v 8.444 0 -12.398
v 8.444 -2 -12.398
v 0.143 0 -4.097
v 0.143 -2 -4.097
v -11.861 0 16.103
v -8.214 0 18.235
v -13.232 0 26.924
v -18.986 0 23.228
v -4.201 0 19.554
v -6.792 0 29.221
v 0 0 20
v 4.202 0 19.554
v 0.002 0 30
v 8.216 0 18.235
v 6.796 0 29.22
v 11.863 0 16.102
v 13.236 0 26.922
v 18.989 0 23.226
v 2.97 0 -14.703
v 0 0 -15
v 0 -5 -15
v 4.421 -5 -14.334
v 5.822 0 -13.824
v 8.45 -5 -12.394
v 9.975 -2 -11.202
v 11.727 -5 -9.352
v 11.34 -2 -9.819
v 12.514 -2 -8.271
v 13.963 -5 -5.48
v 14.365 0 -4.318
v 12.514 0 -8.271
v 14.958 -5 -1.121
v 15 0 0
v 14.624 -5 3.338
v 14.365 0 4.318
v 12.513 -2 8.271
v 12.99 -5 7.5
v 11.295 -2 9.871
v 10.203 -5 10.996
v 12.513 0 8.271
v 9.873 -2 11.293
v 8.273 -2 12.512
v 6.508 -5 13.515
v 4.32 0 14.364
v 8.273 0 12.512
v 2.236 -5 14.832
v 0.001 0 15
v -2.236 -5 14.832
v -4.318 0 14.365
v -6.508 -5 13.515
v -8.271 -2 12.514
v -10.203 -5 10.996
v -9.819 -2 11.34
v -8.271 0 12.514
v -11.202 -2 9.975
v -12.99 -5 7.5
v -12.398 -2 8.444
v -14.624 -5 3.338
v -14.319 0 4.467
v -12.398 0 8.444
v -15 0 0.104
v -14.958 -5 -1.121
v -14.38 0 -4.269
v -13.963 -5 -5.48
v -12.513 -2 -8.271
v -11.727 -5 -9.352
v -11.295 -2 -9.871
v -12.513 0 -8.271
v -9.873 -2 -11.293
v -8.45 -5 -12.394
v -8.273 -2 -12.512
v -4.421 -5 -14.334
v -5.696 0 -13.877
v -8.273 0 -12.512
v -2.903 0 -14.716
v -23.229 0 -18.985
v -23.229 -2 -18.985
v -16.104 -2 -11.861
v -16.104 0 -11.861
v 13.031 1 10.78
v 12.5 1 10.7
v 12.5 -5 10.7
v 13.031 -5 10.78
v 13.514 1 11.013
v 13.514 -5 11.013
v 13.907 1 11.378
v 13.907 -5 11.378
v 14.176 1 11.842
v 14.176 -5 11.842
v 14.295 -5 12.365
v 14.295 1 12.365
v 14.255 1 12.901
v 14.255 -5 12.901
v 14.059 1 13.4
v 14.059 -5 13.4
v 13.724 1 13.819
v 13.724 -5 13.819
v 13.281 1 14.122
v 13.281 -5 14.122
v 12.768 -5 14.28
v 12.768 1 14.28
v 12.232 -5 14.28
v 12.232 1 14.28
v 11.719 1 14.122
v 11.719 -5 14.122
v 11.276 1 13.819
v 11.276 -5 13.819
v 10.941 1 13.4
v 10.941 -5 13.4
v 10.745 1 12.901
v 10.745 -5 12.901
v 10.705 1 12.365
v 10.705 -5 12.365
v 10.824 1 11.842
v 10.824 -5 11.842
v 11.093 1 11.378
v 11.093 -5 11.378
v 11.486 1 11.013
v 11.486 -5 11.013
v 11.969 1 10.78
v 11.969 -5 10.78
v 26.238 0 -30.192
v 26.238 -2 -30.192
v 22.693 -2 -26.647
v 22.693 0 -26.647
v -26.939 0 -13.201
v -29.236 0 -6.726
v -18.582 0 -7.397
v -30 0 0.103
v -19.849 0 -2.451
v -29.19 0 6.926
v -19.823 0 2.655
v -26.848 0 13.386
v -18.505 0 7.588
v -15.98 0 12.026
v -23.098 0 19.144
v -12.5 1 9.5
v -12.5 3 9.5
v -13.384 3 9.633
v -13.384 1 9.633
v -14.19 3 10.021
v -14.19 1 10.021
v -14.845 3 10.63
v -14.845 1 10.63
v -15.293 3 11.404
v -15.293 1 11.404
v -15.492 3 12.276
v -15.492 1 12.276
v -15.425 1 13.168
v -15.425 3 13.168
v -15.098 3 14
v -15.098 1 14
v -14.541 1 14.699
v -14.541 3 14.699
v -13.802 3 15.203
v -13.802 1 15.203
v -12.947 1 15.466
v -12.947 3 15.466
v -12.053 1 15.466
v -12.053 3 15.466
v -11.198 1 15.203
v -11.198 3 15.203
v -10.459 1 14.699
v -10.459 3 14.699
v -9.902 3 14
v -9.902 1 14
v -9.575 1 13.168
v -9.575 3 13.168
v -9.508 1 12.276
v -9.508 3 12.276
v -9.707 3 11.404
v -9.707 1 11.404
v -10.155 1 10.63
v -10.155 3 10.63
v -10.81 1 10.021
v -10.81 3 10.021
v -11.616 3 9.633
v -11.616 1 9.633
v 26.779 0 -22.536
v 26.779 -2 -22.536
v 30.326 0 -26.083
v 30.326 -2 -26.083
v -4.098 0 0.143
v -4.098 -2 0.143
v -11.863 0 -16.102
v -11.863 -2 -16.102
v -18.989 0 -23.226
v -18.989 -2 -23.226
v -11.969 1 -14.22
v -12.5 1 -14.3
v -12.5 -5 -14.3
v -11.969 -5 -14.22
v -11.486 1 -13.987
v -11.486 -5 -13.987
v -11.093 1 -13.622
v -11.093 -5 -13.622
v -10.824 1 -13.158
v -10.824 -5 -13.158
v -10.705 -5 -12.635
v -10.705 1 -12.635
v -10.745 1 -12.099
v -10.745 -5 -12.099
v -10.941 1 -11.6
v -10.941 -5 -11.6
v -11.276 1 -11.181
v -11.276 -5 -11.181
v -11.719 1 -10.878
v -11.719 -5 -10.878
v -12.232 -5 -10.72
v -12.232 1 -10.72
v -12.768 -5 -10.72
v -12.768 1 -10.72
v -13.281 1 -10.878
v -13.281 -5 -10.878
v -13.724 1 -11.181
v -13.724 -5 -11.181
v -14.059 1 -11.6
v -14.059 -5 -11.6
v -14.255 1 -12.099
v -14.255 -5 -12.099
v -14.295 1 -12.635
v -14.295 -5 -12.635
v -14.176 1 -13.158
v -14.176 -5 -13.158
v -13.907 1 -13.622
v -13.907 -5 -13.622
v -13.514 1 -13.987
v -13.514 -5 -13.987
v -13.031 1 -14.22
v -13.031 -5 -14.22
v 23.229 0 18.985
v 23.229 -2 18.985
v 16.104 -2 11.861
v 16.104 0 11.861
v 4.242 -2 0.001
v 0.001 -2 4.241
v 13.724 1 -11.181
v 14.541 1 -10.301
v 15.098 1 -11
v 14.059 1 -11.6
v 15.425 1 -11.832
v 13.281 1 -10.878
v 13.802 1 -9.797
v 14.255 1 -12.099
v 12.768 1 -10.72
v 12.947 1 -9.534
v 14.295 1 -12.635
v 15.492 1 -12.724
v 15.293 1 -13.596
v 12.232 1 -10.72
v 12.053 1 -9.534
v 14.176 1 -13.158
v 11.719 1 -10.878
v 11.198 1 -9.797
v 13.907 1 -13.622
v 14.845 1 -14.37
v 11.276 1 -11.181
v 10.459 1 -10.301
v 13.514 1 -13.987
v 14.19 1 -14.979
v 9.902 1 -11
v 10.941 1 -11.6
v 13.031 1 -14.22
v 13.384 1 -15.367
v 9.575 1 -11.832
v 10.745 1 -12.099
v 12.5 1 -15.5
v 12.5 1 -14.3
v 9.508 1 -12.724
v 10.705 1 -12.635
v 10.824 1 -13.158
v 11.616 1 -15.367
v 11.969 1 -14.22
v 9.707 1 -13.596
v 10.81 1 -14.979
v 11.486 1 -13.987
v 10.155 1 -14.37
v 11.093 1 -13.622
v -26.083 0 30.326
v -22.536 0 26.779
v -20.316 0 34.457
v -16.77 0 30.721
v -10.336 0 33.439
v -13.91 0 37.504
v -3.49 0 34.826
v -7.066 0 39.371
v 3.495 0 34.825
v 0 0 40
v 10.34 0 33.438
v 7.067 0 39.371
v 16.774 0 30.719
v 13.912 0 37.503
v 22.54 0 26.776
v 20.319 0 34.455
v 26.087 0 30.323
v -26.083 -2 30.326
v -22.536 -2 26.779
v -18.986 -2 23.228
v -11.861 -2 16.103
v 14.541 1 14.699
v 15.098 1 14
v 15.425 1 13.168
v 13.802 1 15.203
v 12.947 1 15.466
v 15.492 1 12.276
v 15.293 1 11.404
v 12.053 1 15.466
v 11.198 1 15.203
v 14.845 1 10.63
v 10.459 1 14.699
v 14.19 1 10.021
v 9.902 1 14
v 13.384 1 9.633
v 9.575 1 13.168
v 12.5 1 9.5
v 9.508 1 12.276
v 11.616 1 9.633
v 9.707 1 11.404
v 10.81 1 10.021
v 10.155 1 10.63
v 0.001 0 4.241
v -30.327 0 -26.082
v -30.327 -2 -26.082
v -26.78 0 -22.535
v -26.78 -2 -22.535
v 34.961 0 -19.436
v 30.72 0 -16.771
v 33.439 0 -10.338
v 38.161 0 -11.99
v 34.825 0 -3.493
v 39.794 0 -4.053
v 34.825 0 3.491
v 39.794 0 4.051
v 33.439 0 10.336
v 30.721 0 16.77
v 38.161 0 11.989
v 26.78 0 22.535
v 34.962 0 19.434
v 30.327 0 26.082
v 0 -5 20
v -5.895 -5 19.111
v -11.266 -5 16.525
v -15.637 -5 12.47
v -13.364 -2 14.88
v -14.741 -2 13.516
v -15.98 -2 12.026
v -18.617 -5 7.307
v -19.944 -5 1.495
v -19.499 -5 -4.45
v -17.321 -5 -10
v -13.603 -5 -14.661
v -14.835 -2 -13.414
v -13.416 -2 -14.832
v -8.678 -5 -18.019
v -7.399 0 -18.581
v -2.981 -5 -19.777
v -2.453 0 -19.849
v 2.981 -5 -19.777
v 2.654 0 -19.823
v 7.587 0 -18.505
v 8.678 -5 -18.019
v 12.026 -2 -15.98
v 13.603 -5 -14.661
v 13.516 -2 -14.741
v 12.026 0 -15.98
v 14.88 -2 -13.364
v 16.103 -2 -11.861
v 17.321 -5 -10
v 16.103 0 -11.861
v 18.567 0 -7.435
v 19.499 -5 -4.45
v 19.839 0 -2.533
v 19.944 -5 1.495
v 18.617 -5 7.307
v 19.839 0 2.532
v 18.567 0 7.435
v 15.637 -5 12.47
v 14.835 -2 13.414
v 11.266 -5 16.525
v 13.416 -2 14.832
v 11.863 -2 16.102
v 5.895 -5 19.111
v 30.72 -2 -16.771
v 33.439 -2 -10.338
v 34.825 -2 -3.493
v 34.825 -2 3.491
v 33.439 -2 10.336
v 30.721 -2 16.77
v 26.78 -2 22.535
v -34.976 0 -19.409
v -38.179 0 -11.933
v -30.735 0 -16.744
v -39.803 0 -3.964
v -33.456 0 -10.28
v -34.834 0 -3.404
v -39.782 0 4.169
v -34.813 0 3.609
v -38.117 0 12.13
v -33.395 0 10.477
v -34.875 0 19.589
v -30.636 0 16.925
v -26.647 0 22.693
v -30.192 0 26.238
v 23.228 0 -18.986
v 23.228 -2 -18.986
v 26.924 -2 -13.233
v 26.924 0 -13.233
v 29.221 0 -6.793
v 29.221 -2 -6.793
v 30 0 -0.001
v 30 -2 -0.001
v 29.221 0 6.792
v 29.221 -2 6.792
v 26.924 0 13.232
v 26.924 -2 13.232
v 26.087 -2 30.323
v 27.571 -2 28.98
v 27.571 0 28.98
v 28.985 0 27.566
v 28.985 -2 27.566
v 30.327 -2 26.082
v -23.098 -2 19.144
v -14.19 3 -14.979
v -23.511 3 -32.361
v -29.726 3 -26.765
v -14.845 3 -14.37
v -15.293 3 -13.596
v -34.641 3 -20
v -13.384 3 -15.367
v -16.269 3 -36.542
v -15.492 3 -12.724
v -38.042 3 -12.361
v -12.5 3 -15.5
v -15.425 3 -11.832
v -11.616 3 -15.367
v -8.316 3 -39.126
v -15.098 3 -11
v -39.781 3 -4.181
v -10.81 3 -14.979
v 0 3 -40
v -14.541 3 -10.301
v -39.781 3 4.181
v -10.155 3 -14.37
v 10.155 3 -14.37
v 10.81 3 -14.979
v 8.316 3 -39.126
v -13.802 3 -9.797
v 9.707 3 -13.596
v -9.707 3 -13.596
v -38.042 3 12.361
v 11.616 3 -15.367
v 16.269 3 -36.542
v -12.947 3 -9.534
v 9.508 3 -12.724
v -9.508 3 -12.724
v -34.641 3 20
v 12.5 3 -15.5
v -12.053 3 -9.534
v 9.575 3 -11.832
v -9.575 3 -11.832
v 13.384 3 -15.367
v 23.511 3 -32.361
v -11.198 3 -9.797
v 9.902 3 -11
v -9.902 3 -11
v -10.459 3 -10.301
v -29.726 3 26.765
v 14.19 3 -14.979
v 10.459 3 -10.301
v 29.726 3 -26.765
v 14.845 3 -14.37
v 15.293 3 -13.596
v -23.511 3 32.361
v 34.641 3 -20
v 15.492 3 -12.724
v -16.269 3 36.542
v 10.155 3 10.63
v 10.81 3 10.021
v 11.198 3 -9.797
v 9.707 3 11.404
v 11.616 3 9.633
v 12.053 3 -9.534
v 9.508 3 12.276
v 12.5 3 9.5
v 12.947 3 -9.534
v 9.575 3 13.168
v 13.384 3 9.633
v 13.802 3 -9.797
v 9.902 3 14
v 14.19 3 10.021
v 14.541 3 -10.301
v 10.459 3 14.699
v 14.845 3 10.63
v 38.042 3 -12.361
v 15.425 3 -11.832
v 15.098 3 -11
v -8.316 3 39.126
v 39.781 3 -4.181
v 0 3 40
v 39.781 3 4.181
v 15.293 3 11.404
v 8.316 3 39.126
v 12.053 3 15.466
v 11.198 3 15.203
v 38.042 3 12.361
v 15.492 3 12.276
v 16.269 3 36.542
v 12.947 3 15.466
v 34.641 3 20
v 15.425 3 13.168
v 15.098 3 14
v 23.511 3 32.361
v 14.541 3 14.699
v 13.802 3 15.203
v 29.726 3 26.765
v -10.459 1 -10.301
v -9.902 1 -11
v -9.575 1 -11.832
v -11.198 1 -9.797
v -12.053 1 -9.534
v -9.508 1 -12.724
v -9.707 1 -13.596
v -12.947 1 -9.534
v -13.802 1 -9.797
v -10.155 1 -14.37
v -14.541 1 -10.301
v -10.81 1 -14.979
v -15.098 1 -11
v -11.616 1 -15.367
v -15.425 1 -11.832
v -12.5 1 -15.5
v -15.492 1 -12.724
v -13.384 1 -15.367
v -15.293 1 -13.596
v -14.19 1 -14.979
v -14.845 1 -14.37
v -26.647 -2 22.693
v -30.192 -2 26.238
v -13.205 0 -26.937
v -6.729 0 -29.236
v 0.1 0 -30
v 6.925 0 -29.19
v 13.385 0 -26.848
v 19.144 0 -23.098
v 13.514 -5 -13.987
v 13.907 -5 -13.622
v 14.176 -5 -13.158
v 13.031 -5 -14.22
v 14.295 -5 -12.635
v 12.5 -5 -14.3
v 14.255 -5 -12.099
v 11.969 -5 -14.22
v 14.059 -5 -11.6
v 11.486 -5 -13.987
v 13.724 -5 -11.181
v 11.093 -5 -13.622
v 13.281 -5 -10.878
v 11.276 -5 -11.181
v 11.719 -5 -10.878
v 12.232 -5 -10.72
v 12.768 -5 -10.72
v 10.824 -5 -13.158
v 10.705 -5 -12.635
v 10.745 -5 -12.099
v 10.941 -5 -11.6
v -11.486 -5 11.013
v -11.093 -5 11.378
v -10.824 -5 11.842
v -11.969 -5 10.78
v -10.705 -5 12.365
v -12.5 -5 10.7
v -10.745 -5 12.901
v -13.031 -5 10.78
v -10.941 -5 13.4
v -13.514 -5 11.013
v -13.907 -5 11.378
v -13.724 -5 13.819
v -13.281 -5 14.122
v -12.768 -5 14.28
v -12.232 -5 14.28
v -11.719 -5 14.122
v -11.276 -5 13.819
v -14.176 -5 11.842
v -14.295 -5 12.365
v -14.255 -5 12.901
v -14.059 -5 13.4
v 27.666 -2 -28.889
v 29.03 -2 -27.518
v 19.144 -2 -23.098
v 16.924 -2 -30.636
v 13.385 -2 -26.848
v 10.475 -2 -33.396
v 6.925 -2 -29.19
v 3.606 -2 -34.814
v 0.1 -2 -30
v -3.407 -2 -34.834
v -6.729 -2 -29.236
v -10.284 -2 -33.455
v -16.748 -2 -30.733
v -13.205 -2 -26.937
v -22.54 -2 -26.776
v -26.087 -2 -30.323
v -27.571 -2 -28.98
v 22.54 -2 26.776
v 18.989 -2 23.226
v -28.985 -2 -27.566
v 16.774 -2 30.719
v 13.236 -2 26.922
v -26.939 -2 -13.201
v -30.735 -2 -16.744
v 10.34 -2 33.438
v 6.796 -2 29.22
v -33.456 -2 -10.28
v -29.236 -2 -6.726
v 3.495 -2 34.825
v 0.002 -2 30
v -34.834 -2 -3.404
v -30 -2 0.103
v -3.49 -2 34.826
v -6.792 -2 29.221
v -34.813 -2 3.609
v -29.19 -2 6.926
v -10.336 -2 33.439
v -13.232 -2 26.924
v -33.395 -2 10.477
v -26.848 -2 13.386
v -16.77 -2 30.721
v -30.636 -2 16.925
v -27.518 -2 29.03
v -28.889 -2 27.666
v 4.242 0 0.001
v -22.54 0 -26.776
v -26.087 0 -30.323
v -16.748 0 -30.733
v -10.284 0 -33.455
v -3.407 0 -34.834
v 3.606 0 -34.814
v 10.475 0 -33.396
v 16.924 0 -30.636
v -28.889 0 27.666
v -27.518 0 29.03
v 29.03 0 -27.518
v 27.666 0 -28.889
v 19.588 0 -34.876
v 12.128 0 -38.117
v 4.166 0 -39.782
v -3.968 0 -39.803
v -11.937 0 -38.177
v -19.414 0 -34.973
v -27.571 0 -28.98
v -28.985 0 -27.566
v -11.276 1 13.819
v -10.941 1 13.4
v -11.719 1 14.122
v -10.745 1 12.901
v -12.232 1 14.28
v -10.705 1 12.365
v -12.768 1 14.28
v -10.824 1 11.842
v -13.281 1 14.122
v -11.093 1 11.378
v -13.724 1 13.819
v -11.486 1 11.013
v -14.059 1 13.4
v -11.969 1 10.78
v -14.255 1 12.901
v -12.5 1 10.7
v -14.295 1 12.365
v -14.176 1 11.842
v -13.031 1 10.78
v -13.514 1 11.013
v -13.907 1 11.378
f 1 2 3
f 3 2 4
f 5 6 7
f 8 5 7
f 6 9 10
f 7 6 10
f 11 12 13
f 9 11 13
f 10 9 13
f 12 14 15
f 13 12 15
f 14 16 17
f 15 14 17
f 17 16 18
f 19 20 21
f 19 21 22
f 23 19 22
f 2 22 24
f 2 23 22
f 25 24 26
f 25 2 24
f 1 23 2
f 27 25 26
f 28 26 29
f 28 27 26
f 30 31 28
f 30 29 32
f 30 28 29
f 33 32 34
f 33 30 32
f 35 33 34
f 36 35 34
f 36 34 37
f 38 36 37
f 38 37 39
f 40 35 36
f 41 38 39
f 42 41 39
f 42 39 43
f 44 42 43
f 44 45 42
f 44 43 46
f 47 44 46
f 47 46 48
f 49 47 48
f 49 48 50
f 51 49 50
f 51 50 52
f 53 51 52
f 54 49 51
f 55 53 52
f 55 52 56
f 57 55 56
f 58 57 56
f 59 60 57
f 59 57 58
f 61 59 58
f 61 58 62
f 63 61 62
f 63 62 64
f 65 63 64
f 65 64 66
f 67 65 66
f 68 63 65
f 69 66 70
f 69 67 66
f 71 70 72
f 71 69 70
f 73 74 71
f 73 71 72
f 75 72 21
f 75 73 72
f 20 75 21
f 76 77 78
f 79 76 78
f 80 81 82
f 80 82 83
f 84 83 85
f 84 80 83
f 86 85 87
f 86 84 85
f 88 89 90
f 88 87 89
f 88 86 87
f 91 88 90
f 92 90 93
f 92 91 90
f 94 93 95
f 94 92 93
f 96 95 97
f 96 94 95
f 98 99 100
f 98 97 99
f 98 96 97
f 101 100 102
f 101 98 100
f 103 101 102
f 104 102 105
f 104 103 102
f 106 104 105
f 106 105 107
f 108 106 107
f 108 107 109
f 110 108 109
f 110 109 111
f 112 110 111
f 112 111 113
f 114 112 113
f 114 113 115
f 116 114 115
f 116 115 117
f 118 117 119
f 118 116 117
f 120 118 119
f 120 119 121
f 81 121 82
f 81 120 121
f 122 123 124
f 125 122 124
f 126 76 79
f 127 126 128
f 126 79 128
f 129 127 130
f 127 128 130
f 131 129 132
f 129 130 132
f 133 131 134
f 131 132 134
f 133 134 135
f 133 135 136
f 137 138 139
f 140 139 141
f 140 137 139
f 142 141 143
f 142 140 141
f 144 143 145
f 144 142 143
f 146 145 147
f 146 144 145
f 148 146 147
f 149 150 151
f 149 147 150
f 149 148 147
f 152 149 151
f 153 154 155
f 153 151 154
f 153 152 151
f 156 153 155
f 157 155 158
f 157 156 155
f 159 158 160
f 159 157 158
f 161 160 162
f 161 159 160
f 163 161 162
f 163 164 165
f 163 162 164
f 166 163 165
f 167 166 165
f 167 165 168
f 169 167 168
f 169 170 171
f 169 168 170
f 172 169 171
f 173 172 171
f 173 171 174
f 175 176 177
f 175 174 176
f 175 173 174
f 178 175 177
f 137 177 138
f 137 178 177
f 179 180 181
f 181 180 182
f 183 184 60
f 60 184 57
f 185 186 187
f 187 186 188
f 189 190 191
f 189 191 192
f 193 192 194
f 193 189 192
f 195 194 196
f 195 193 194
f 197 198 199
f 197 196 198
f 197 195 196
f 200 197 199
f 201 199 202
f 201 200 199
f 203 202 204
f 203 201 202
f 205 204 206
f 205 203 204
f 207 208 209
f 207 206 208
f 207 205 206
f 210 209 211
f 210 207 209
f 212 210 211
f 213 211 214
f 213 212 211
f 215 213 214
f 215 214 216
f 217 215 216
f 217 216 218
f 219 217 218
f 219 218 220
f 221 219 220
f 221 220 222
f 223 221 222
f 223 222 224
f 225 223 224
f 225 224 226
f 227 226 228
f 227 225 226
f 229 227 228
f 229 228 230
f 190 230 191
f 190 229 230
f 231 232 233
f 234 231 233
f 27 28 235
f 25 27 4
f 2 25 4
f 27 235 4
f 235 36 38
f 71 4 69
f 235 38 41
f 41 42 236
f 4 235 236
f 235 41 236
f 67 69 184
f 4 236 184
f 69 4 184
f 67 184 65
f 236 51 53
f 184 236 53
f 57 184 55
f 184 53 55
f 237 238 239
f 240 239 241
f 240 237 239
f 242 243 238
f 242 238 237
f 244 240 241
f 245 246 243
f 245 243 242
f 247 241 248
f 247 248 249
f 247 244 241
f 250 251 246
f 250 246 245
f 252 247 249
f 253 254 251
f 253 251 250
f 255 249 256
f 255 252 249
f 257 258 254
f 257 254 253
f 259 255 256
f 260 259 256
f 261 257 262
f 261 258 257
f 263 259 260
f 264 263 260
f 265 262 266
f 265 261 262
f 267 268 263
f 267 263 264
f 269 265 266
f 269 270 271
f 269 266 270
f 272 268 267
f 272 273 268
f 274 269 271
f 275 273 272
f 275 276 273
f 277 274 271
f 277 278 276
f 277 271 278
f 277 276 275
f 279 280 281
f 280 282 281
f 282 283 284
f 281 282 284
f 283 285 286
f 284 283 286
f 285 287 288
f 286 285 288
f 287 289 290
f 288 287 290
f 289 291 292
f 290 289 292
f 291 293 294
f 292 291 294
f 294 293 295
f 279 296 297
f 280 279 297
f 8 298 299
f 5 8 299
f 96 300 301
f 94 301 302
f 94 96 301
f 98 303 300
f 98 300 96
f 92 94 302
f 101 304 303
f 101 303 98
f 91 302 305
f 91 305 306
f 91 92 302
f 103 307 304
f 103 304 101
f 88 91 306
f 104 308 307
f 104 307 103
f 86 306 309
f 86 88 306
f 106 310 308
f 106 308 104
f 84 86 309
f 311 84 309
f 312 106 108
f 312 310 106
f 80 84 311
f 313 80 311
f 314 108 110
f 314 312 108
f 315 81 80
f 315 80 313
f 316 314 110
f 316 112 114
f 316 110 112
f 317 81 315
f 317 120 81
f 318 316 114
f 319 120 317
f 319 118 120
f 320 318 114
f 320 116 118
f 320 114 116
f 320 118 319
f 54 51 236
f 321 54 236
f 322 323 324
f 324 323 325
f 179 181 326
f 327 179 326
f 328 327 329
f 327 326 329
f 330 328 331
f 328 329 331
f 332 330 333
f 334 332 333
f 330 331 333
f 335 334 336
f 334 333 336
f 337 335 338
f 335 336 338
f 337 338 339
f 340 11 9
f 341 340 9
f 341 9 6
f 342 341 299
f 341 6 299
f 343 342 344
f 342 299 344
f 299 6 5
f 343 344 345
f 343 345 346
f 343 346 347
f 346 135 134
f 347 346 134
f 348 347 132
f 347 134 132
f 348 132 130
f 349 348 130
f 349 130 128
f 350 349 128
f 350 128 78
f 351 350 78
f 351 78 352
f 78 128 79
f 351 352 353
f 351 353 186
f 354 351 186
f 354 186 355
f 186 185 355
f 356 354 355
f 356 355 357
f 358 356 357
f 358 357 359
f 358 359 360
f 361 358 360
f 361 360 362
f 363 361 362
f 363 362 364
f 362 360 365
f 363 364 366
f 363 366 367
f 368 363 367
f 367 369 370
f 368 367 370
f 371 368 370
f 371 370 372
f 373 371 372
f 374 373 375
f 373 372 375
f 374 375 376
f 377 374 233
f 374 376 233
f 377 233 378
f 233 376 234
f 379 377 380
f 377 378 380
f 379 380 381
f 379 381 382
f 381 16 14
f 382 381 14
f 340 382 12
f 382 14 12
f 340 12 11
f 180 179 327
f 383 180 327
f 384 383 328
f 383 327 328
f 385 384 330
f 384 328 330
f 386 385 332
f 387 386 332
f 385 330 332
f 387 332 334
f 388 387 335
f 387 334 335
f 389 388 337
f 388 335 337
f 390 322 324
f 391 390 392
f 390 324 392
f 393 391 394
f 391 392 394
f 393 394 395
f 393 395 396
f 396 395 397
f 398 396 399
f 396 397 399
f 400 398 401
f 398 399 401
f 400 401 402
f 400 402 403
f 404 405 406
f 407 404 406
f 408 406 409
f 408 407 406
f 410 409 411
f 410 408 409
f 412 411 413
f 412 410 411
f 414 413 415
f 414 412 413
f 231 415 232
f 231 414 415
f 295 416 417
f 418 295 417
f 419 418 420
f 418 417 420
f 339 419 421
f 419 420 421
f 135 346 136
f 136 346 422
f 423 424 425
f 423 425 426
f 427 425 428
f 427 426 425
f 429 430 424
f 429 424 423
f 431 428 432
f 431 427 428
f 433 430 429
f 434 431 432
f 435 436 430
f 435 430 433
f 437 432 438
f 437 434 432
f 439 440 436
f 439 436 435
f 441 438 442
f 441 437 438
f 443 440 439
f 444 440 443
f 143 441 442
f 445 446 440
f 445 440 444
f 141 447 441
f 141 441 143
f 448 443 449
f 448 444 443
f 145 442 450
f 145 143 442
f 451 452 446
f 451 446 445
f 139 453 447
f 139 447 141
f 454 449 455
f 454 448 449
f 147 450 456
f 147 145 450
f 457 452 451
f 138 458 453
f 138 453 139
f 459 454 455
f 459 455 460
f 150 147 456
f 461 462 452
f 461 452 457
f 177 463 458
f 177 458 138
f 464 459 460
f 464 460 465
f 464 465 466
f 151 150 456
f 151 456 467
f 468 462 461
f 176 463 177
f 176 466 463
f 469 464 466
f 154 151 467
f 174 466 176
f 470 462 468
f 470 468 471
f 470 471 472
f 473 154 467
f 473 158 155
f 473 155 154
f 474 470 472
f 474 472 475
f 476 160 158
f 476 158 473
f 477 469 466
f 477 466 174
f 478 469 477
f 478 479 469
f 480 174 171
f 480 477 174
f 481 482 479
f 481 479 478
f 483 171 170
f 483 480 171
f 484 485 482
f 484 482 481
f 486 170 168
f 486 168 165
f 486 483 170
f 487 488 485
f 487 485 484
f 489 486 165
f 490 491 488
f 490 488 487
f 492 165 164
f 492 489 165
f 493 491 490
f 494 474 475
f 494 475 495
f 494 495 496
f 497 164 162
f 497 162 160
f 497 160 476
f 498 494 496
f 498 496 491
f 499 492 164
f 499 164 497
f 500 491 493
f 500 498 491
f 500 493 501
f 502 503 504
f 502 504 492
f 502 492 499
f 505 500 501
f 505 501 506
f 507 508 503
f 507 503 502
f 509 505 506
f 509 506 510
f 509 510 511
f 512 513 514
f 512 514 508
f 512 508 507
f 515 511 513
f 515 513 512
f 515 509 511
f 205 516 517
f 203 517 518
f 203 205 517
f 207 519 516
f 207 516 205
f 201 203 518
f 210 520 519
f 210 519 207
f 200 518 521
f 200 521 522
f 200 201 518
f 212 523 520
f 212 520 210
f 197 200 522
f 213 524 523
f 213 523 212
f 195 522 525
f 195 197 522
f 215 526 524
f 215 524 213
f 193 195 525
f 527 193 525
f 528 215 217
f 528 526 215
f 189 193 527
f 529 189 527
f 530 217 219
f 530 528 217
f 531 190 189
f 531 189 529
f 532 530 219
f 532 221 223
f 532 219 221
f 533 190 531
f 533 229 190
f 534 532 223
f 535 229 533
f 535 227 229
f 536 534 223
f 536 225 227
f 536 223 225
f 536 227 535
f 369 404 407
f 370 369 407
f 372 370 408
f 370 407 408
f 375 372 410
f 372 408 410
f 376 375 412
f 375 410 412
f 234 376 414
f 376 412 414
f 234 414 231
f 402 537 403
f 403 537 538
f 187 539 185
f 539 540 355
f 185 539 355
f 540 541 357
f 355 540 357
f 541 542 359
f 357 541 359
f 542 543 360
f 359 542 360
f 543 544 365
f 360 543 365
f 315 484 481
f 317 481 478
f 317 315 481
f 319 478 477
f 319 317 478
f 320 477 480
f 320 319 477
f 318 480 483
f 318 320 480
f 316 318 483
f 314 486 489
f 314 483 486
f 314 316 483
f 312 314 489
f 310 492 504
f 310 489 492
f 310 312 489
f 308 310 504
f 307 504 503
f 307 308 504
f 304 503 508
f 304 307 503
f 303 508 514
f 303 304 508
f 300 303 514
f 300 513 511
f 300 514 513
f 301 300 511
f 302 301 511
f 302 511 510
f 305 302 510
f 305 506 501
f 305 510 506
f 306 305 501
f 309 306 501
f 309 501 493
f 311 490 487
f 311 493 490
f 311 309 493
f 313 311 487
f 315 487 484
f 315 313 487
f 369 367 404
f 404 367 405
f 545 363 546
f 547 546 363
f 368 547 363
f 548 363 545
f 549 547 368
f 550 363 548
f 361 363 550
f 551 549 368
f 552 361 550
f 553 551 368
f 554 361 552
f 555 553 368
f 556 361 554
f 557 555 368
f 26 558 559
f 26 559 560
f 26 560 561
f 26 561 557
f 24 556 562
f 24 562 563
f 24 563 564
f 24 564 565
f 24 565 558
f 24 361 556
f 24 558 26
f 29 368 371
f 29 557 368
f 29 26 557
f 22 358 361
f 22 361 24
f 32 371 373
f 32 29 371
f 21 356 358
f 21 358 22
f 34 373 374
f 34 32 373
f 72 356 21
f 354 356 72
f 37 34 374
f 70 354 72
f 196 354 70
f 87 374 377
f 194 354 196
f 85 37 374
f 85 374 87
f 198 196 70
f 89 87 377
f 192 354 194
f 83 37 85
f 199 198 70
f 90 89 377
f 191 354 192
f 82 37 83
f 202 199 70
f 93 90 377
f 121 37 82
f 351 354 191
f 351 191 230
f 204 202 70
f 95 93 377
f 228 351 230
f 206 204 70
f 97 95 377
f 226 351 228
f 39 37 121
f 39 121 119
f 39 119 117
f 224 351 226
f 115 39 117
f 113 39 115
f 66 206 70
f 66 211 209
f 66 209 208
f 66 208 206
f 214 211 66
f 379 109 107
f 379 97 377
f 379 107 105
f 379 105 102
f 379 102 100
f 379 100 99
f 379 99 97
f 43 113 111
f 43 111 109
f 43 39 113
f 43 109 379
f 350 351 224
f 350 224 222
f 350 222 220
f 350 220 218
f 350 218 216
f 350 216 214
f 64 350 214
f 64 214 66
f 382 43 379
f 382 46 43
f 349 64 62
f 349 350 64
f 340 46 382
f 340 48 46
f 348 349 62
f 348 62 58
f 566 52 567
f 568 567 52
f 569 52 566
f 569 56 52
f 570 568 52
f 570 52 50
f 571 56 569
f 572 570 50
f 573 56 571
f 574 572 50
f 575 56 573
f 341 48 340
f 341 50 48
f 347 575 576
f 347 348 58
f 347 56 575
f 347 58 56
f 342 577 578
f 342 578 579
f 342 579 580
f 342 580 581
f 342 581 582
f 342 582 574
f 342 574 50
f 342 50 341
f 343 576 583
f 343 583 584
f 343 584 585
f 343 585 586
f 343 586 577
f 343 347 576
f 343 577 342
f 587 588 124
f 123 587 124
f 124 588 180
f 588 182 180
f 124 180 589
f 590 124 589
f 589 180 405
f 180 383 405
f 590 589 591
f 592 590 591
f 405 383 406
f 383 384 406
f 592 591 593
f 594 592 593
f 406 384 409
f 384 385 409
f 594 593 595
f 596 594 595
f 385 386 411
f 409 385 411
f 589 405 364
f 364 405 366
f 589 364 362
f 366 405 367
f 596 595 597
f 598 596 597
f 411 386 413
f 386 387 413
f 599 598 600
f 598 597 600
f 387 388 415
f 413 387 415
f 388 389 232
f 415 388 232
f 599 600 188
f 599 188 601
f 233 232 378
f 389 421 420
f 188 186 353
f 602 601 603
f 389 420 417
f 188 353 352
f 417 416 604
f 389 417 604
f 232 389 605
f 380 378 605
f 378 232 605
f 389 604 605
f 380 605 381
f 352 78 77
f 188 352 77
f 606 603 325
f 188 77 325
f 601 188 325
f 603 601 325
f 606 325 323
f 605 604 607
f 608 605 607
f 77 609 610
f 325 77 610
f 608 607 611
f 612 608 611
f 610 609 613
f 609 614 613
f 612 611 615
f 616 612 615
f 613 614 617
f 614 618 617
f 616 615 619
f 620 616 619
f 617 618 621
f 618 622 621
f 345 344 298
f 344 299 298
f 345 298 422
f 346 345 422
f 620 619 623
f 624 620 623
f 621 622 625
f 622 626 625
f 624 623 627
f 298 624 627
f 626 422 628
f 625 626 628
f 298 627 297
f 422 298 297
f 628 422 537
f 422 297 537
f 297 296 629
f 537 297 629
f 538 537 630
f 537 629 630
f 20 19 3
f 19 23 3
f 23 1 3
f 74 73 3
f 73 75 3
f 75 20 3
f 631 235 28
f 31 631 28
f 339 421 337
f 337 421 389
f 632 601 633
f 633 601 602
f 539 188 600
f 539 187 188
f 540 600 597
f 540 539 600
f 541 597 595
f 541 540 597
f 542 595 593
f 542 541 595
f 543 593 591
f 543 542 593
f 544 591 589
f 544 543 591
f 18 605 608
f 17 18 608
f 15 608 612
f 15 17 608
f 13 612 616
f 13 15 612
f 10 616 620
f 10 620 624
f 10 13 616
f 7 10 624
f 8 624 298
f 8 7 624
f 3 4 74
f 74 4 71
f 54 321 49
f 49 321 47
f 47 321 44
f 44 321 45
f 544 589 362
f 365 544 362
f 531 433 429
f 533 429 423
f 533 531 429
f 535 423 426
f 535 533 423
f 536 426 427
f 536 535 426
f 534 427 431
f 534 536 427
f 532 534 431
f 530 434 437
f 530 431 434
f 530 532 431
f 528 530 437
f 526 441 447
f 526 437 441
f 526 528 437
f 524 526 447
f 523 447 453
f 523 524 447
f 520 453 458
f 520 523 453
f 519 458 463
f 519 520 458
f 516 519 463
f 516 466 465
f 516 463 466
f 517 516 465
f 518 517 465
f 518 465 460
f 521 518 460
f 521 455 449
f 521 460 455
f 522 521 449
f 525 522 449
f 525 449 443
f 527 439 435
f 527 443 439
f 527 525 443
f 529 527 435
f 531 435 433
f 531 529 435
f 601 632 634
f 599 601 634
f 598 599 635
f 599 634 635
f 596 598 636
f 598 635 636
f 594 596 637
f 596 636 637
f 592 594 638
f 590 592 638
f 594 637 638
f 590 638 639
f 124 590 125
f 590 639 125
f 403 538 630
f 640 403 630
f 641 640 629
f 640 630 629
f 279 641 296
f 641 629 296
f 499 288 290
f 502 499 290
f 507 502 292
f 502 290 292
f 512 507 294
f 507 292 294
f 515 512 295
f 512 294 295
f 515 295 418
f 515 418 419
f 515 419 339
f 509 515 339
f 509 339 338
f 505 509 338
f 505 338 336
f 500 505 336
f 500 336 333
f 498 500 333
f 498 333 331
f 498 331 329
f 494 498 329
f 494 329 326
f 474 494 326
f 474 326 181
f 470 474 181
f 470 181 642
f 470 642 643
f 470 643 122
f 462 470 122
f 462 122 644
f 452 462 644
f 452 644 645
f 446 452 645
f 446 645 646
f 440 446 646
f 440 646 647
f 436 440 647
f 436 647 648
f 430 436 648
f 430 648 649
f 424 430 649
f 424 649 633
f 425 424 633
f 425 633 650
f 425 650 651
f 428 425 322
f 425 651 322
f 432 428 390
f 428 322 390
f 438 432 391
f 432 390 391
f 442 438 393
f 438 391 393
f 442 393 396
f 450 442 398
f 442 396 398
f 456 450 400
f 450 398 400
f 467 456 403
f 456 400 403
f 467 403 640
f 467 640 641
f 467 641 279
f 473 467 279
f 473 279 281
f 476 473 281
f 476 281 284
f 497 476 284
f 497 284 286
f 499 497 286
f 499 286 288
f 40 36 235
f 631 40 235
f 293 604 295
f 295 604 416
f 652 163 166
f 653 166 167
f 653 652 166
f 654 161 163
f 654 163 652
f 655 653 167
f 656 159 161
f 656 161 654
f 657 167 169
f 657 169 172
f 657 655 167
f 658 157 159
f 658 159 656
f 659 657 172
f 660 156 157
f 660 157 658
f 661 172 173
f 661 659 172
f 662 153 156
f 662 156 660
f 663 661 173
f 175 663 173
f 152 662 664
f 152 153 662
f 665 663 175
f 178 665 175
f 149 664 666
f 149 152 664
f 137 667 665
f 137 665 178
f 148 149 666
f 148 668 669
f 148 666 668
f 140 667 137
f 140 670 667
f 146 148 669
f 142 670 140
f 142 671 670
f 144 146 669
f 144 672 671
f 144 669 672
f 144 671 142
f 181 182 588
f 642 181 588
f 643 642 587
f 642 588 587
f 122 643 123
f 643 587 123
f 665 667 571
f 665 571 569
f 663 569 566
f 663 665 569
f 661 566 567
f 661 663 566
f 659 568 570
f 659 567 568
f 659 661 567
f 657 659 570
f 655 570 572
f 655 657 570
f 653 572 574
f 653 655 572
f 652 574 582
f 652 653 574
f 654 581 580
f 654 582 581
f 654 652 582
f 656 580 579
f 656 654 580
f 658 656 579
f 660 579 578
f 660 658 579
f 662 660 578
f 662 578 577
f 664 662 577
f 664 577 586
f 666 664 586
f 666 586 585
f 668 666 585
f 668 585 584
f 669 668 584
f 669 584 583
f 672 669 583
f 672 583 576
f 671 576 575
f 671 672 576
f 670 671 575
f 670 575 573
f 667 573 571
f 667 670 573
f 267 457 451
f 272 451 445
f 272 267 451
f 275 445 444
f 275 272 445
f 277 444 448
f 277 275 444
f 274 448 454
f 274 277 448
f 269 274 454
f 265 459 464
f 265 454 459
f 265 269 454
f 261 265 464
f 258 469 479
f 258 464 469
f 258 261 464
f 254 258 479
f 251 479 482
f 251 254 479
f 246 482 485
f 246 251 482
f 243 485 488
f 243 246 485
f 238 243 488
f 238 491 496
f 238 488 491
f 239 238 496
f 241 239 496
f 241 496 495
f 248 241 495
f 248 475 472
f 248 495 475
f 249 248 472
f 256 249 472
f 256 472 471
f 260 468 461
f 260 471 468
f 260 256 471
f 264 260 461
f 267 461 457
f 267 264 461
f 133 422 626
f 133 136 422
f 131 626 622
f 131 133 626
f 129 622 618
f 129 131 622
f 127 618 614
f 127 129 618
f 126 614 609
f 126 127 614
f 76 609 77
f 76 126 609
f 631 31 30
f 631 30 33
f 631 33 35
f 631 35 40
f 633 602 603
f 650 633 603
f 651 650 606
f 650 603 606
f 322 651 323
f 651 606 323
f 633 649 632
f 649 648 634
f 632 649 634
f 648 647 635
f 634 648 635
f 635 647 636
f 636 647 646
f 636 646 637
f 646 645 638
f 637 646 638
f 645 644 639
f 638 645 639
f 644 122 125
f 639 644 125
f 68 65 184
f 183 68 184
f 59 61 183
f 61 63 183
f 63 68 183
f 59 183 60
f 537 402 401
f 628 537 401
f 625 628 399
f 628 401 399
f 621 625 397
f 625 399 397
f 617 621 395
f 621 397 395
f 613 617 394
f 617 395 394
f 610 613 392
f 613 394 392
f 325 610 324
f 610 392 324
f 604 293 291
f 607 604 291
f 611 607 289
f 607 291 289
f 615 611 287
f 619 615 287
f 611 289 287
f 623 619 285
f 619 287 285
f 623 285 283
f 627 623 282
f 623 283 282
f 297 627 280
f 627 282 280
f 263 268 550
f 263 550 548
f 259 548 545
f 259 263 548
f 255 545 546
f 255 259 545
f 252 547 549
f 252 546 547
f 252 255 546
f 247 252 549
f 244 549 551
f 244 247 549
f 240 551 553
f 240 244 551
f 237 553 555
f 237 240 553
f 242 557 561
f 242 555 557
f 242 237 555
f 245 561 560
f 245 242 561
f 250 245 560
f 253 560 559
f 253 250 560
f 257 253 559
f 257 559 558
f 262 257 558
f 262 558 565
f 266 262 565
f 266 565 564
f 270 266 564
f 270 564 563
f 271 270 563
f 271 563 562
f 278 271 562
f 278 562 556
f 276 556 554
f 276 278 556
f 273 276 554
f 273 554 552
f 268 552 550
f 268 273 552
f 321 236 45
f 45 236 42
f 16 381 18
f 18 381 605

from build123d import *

# Parameters (mm, degrees)
SKETCH_1_R               = 40
EXTRUDE_1_DEPTH          = 3
SKETCH_2_R               = 35
SKETCH_2_R_2             = 30
EXTRUDE_2_DEPTH          = 2
SKETCH_3_R               = 20
SKETCH_3_R_2             = 15
EXTRUDE_3_DEPTH          = 5
EXTRUDE_START            = 2
EXTRUDE_5_DEPTH          = 2
EXTRUDE_4_DEPTH          = 2
CUT_EXTRUDE_2_DEPTH      = 57.789083458
CUT_EXTRUDE_2_DEPTH_BACK = 57.789083458
SKETCH_8_R               = 1.8
CUT_EXTRUDE_3_DEPTH      = 58.131427428
CUT_EXTRUDE_3_DEPTH_BACK = 2
SKETCH_9_R               = 3


with BuildPart() as part:
    # 草图1 → 凸台-拉伸1 (new body)
    with BuildSketch(Plane(origin=(0, 0, 0), x_dir=(1, 0, 0), z_dir=(0, 1, 0))):
        with Locations(Location((0, 0, 0), (0, 0, 270))):
            Circle(SKETCH_1_R)
    extrude(amount=EXTRUDE_1_DEPTH)

    # 草图2 → 凸台-拉伸2 (add)
    with BuildSketch(Plane.XZ):
        with Locations(Location((0, 0, 0), (0, 0, 90))):
            Circle(SKETCH_2_R)
        with Locations(Location((0, 0, 0), (0, 0, 270))):
            Circle(SKETCH_2_R_2, mode=Mode.SUBTRACT)
    extrude(amount=EXTRUDE_2_DEPTH)

    # 草图3 → 凸台-拉伸3 (add)
    with BuildSketch(Plane.XZ):
        with Locations(Location((0, 0, 0), (0, 0, 90))):
            Circle(SKETCH_3_R)
        with Locations(Location((0, 0, 0), (0, 0, 270))):
            Circle(SKETCH_3_R_2, mode=Mode.SUBTRACT)
    extrude(amount=EXTRUDE_3_DEPTH)

    # 草图7 → 凸台-拉伸5 (add)
    with BuildSketch(Plane.XZ.offset(EXTRUDE_START)):
        with BuildLine():
            Line((-26.083289209, 30.325929896), (30.325929896, -26.083289209))
            ThreePointArc((30.325929896, -26.083289209), (28.356463256, -28.211894506), (26.237952221, -30.192215275))
            Line((26.237952221, -30.192215275), (-30.192215275, 26.237952221))
            ThreePointArc((-30.192215275, 26.237952221), (-28.211894506, 28.356463256), (-26.083289209, 30.325929896))
        make_face()
    extrude(amount=-EXTRUDE_5_DEPTH)

    # 草图6 → 凸台-拉伸4 (add)
    with BuildSketch(Plane.XZ.offset(EXTRUDE_START)):
        with BuildLine():
            Line((-30.327162218, -26.081856372), (26.087002686, 30.322735543))
            ThreePointArc((26.087002686, 30.322735543), (28.286671146, 28.281871146), (30.327162218, 26.081856372))
            Line((30.327162218, 26.081856372), (-26.087002686, -30.322735543))
            ThreePointArc((-26.087002686, -30.322735543), (-28.286671146, -28.281871146), (-30.327162218, -26.081856372))
        make_face()
    extrude(amount=-EXTRUDE_4_DEPTH)

    # 草图8 → 切除-拉伸2 (cut, two sides: drawn at the far end of the back side and taken through both)
    with BuildSketch(Plane.XZ.offset(-CUT_EXTRUDE_2_DEPTH_BACK)):
        with Locations(Location((12.5, -12.5, 0), (0, 0, 270))):
            Circle(SKETCH_8_R)
        with Locations(Location((12.5, 12.5, 0), (0, 0, 270))):
            Circle(SKETCH_8_R)
        with Locations(Location((-12.5, -12.5, 0), (0, 0, 270))):
            Circle(SKETCH_8_R)
        with Locations(Location((-12.5, 12.5, 0), (0, 0, 270))):
            Circle(SKETCH_8_R)
    extrude(amount=CUT_EXTRUDE_2_DEPTH + CUT_EXTRUDE_2_DEPTH_BACK, mode=Mode.SUBTRACT)

    # 草图9 → 切除-拉伸3 (cut, two sides: drawn at the far end of the back side and taken through both)
    with BuildSketch(Plane(origin=(0, 3, 0), x_dir=(1, 0, 0), z_dir=(0, 1, 0)).offset(-CUT_EXTRUDE_3_DEPTH_BACK)):
        with Locations(Location((-12.5, 12.5, 0), (0, 0, 90))):
            Circle(SKETCH_9_R)
        with Locations(Location((12.5, 12.5, 0), (0, 0, 90))):
            Circle(SKETCH_9_R)
        with Locations(Location((-12.5, -12.5, 0), (0, 0, 90))):
            Circle(SKETCH_9_R)
        with Locations(Location((12.5, -12.5, 0), (0, 0, 90))):
            Circle(SKETCH_9_R)
    extrude(amount=CUT_EXTRUDE_3_DEPTH + CUT_EXTRUDE_3_DEPTH_BACK, mode=Mode.SUBTRACT)


solid = part.part
